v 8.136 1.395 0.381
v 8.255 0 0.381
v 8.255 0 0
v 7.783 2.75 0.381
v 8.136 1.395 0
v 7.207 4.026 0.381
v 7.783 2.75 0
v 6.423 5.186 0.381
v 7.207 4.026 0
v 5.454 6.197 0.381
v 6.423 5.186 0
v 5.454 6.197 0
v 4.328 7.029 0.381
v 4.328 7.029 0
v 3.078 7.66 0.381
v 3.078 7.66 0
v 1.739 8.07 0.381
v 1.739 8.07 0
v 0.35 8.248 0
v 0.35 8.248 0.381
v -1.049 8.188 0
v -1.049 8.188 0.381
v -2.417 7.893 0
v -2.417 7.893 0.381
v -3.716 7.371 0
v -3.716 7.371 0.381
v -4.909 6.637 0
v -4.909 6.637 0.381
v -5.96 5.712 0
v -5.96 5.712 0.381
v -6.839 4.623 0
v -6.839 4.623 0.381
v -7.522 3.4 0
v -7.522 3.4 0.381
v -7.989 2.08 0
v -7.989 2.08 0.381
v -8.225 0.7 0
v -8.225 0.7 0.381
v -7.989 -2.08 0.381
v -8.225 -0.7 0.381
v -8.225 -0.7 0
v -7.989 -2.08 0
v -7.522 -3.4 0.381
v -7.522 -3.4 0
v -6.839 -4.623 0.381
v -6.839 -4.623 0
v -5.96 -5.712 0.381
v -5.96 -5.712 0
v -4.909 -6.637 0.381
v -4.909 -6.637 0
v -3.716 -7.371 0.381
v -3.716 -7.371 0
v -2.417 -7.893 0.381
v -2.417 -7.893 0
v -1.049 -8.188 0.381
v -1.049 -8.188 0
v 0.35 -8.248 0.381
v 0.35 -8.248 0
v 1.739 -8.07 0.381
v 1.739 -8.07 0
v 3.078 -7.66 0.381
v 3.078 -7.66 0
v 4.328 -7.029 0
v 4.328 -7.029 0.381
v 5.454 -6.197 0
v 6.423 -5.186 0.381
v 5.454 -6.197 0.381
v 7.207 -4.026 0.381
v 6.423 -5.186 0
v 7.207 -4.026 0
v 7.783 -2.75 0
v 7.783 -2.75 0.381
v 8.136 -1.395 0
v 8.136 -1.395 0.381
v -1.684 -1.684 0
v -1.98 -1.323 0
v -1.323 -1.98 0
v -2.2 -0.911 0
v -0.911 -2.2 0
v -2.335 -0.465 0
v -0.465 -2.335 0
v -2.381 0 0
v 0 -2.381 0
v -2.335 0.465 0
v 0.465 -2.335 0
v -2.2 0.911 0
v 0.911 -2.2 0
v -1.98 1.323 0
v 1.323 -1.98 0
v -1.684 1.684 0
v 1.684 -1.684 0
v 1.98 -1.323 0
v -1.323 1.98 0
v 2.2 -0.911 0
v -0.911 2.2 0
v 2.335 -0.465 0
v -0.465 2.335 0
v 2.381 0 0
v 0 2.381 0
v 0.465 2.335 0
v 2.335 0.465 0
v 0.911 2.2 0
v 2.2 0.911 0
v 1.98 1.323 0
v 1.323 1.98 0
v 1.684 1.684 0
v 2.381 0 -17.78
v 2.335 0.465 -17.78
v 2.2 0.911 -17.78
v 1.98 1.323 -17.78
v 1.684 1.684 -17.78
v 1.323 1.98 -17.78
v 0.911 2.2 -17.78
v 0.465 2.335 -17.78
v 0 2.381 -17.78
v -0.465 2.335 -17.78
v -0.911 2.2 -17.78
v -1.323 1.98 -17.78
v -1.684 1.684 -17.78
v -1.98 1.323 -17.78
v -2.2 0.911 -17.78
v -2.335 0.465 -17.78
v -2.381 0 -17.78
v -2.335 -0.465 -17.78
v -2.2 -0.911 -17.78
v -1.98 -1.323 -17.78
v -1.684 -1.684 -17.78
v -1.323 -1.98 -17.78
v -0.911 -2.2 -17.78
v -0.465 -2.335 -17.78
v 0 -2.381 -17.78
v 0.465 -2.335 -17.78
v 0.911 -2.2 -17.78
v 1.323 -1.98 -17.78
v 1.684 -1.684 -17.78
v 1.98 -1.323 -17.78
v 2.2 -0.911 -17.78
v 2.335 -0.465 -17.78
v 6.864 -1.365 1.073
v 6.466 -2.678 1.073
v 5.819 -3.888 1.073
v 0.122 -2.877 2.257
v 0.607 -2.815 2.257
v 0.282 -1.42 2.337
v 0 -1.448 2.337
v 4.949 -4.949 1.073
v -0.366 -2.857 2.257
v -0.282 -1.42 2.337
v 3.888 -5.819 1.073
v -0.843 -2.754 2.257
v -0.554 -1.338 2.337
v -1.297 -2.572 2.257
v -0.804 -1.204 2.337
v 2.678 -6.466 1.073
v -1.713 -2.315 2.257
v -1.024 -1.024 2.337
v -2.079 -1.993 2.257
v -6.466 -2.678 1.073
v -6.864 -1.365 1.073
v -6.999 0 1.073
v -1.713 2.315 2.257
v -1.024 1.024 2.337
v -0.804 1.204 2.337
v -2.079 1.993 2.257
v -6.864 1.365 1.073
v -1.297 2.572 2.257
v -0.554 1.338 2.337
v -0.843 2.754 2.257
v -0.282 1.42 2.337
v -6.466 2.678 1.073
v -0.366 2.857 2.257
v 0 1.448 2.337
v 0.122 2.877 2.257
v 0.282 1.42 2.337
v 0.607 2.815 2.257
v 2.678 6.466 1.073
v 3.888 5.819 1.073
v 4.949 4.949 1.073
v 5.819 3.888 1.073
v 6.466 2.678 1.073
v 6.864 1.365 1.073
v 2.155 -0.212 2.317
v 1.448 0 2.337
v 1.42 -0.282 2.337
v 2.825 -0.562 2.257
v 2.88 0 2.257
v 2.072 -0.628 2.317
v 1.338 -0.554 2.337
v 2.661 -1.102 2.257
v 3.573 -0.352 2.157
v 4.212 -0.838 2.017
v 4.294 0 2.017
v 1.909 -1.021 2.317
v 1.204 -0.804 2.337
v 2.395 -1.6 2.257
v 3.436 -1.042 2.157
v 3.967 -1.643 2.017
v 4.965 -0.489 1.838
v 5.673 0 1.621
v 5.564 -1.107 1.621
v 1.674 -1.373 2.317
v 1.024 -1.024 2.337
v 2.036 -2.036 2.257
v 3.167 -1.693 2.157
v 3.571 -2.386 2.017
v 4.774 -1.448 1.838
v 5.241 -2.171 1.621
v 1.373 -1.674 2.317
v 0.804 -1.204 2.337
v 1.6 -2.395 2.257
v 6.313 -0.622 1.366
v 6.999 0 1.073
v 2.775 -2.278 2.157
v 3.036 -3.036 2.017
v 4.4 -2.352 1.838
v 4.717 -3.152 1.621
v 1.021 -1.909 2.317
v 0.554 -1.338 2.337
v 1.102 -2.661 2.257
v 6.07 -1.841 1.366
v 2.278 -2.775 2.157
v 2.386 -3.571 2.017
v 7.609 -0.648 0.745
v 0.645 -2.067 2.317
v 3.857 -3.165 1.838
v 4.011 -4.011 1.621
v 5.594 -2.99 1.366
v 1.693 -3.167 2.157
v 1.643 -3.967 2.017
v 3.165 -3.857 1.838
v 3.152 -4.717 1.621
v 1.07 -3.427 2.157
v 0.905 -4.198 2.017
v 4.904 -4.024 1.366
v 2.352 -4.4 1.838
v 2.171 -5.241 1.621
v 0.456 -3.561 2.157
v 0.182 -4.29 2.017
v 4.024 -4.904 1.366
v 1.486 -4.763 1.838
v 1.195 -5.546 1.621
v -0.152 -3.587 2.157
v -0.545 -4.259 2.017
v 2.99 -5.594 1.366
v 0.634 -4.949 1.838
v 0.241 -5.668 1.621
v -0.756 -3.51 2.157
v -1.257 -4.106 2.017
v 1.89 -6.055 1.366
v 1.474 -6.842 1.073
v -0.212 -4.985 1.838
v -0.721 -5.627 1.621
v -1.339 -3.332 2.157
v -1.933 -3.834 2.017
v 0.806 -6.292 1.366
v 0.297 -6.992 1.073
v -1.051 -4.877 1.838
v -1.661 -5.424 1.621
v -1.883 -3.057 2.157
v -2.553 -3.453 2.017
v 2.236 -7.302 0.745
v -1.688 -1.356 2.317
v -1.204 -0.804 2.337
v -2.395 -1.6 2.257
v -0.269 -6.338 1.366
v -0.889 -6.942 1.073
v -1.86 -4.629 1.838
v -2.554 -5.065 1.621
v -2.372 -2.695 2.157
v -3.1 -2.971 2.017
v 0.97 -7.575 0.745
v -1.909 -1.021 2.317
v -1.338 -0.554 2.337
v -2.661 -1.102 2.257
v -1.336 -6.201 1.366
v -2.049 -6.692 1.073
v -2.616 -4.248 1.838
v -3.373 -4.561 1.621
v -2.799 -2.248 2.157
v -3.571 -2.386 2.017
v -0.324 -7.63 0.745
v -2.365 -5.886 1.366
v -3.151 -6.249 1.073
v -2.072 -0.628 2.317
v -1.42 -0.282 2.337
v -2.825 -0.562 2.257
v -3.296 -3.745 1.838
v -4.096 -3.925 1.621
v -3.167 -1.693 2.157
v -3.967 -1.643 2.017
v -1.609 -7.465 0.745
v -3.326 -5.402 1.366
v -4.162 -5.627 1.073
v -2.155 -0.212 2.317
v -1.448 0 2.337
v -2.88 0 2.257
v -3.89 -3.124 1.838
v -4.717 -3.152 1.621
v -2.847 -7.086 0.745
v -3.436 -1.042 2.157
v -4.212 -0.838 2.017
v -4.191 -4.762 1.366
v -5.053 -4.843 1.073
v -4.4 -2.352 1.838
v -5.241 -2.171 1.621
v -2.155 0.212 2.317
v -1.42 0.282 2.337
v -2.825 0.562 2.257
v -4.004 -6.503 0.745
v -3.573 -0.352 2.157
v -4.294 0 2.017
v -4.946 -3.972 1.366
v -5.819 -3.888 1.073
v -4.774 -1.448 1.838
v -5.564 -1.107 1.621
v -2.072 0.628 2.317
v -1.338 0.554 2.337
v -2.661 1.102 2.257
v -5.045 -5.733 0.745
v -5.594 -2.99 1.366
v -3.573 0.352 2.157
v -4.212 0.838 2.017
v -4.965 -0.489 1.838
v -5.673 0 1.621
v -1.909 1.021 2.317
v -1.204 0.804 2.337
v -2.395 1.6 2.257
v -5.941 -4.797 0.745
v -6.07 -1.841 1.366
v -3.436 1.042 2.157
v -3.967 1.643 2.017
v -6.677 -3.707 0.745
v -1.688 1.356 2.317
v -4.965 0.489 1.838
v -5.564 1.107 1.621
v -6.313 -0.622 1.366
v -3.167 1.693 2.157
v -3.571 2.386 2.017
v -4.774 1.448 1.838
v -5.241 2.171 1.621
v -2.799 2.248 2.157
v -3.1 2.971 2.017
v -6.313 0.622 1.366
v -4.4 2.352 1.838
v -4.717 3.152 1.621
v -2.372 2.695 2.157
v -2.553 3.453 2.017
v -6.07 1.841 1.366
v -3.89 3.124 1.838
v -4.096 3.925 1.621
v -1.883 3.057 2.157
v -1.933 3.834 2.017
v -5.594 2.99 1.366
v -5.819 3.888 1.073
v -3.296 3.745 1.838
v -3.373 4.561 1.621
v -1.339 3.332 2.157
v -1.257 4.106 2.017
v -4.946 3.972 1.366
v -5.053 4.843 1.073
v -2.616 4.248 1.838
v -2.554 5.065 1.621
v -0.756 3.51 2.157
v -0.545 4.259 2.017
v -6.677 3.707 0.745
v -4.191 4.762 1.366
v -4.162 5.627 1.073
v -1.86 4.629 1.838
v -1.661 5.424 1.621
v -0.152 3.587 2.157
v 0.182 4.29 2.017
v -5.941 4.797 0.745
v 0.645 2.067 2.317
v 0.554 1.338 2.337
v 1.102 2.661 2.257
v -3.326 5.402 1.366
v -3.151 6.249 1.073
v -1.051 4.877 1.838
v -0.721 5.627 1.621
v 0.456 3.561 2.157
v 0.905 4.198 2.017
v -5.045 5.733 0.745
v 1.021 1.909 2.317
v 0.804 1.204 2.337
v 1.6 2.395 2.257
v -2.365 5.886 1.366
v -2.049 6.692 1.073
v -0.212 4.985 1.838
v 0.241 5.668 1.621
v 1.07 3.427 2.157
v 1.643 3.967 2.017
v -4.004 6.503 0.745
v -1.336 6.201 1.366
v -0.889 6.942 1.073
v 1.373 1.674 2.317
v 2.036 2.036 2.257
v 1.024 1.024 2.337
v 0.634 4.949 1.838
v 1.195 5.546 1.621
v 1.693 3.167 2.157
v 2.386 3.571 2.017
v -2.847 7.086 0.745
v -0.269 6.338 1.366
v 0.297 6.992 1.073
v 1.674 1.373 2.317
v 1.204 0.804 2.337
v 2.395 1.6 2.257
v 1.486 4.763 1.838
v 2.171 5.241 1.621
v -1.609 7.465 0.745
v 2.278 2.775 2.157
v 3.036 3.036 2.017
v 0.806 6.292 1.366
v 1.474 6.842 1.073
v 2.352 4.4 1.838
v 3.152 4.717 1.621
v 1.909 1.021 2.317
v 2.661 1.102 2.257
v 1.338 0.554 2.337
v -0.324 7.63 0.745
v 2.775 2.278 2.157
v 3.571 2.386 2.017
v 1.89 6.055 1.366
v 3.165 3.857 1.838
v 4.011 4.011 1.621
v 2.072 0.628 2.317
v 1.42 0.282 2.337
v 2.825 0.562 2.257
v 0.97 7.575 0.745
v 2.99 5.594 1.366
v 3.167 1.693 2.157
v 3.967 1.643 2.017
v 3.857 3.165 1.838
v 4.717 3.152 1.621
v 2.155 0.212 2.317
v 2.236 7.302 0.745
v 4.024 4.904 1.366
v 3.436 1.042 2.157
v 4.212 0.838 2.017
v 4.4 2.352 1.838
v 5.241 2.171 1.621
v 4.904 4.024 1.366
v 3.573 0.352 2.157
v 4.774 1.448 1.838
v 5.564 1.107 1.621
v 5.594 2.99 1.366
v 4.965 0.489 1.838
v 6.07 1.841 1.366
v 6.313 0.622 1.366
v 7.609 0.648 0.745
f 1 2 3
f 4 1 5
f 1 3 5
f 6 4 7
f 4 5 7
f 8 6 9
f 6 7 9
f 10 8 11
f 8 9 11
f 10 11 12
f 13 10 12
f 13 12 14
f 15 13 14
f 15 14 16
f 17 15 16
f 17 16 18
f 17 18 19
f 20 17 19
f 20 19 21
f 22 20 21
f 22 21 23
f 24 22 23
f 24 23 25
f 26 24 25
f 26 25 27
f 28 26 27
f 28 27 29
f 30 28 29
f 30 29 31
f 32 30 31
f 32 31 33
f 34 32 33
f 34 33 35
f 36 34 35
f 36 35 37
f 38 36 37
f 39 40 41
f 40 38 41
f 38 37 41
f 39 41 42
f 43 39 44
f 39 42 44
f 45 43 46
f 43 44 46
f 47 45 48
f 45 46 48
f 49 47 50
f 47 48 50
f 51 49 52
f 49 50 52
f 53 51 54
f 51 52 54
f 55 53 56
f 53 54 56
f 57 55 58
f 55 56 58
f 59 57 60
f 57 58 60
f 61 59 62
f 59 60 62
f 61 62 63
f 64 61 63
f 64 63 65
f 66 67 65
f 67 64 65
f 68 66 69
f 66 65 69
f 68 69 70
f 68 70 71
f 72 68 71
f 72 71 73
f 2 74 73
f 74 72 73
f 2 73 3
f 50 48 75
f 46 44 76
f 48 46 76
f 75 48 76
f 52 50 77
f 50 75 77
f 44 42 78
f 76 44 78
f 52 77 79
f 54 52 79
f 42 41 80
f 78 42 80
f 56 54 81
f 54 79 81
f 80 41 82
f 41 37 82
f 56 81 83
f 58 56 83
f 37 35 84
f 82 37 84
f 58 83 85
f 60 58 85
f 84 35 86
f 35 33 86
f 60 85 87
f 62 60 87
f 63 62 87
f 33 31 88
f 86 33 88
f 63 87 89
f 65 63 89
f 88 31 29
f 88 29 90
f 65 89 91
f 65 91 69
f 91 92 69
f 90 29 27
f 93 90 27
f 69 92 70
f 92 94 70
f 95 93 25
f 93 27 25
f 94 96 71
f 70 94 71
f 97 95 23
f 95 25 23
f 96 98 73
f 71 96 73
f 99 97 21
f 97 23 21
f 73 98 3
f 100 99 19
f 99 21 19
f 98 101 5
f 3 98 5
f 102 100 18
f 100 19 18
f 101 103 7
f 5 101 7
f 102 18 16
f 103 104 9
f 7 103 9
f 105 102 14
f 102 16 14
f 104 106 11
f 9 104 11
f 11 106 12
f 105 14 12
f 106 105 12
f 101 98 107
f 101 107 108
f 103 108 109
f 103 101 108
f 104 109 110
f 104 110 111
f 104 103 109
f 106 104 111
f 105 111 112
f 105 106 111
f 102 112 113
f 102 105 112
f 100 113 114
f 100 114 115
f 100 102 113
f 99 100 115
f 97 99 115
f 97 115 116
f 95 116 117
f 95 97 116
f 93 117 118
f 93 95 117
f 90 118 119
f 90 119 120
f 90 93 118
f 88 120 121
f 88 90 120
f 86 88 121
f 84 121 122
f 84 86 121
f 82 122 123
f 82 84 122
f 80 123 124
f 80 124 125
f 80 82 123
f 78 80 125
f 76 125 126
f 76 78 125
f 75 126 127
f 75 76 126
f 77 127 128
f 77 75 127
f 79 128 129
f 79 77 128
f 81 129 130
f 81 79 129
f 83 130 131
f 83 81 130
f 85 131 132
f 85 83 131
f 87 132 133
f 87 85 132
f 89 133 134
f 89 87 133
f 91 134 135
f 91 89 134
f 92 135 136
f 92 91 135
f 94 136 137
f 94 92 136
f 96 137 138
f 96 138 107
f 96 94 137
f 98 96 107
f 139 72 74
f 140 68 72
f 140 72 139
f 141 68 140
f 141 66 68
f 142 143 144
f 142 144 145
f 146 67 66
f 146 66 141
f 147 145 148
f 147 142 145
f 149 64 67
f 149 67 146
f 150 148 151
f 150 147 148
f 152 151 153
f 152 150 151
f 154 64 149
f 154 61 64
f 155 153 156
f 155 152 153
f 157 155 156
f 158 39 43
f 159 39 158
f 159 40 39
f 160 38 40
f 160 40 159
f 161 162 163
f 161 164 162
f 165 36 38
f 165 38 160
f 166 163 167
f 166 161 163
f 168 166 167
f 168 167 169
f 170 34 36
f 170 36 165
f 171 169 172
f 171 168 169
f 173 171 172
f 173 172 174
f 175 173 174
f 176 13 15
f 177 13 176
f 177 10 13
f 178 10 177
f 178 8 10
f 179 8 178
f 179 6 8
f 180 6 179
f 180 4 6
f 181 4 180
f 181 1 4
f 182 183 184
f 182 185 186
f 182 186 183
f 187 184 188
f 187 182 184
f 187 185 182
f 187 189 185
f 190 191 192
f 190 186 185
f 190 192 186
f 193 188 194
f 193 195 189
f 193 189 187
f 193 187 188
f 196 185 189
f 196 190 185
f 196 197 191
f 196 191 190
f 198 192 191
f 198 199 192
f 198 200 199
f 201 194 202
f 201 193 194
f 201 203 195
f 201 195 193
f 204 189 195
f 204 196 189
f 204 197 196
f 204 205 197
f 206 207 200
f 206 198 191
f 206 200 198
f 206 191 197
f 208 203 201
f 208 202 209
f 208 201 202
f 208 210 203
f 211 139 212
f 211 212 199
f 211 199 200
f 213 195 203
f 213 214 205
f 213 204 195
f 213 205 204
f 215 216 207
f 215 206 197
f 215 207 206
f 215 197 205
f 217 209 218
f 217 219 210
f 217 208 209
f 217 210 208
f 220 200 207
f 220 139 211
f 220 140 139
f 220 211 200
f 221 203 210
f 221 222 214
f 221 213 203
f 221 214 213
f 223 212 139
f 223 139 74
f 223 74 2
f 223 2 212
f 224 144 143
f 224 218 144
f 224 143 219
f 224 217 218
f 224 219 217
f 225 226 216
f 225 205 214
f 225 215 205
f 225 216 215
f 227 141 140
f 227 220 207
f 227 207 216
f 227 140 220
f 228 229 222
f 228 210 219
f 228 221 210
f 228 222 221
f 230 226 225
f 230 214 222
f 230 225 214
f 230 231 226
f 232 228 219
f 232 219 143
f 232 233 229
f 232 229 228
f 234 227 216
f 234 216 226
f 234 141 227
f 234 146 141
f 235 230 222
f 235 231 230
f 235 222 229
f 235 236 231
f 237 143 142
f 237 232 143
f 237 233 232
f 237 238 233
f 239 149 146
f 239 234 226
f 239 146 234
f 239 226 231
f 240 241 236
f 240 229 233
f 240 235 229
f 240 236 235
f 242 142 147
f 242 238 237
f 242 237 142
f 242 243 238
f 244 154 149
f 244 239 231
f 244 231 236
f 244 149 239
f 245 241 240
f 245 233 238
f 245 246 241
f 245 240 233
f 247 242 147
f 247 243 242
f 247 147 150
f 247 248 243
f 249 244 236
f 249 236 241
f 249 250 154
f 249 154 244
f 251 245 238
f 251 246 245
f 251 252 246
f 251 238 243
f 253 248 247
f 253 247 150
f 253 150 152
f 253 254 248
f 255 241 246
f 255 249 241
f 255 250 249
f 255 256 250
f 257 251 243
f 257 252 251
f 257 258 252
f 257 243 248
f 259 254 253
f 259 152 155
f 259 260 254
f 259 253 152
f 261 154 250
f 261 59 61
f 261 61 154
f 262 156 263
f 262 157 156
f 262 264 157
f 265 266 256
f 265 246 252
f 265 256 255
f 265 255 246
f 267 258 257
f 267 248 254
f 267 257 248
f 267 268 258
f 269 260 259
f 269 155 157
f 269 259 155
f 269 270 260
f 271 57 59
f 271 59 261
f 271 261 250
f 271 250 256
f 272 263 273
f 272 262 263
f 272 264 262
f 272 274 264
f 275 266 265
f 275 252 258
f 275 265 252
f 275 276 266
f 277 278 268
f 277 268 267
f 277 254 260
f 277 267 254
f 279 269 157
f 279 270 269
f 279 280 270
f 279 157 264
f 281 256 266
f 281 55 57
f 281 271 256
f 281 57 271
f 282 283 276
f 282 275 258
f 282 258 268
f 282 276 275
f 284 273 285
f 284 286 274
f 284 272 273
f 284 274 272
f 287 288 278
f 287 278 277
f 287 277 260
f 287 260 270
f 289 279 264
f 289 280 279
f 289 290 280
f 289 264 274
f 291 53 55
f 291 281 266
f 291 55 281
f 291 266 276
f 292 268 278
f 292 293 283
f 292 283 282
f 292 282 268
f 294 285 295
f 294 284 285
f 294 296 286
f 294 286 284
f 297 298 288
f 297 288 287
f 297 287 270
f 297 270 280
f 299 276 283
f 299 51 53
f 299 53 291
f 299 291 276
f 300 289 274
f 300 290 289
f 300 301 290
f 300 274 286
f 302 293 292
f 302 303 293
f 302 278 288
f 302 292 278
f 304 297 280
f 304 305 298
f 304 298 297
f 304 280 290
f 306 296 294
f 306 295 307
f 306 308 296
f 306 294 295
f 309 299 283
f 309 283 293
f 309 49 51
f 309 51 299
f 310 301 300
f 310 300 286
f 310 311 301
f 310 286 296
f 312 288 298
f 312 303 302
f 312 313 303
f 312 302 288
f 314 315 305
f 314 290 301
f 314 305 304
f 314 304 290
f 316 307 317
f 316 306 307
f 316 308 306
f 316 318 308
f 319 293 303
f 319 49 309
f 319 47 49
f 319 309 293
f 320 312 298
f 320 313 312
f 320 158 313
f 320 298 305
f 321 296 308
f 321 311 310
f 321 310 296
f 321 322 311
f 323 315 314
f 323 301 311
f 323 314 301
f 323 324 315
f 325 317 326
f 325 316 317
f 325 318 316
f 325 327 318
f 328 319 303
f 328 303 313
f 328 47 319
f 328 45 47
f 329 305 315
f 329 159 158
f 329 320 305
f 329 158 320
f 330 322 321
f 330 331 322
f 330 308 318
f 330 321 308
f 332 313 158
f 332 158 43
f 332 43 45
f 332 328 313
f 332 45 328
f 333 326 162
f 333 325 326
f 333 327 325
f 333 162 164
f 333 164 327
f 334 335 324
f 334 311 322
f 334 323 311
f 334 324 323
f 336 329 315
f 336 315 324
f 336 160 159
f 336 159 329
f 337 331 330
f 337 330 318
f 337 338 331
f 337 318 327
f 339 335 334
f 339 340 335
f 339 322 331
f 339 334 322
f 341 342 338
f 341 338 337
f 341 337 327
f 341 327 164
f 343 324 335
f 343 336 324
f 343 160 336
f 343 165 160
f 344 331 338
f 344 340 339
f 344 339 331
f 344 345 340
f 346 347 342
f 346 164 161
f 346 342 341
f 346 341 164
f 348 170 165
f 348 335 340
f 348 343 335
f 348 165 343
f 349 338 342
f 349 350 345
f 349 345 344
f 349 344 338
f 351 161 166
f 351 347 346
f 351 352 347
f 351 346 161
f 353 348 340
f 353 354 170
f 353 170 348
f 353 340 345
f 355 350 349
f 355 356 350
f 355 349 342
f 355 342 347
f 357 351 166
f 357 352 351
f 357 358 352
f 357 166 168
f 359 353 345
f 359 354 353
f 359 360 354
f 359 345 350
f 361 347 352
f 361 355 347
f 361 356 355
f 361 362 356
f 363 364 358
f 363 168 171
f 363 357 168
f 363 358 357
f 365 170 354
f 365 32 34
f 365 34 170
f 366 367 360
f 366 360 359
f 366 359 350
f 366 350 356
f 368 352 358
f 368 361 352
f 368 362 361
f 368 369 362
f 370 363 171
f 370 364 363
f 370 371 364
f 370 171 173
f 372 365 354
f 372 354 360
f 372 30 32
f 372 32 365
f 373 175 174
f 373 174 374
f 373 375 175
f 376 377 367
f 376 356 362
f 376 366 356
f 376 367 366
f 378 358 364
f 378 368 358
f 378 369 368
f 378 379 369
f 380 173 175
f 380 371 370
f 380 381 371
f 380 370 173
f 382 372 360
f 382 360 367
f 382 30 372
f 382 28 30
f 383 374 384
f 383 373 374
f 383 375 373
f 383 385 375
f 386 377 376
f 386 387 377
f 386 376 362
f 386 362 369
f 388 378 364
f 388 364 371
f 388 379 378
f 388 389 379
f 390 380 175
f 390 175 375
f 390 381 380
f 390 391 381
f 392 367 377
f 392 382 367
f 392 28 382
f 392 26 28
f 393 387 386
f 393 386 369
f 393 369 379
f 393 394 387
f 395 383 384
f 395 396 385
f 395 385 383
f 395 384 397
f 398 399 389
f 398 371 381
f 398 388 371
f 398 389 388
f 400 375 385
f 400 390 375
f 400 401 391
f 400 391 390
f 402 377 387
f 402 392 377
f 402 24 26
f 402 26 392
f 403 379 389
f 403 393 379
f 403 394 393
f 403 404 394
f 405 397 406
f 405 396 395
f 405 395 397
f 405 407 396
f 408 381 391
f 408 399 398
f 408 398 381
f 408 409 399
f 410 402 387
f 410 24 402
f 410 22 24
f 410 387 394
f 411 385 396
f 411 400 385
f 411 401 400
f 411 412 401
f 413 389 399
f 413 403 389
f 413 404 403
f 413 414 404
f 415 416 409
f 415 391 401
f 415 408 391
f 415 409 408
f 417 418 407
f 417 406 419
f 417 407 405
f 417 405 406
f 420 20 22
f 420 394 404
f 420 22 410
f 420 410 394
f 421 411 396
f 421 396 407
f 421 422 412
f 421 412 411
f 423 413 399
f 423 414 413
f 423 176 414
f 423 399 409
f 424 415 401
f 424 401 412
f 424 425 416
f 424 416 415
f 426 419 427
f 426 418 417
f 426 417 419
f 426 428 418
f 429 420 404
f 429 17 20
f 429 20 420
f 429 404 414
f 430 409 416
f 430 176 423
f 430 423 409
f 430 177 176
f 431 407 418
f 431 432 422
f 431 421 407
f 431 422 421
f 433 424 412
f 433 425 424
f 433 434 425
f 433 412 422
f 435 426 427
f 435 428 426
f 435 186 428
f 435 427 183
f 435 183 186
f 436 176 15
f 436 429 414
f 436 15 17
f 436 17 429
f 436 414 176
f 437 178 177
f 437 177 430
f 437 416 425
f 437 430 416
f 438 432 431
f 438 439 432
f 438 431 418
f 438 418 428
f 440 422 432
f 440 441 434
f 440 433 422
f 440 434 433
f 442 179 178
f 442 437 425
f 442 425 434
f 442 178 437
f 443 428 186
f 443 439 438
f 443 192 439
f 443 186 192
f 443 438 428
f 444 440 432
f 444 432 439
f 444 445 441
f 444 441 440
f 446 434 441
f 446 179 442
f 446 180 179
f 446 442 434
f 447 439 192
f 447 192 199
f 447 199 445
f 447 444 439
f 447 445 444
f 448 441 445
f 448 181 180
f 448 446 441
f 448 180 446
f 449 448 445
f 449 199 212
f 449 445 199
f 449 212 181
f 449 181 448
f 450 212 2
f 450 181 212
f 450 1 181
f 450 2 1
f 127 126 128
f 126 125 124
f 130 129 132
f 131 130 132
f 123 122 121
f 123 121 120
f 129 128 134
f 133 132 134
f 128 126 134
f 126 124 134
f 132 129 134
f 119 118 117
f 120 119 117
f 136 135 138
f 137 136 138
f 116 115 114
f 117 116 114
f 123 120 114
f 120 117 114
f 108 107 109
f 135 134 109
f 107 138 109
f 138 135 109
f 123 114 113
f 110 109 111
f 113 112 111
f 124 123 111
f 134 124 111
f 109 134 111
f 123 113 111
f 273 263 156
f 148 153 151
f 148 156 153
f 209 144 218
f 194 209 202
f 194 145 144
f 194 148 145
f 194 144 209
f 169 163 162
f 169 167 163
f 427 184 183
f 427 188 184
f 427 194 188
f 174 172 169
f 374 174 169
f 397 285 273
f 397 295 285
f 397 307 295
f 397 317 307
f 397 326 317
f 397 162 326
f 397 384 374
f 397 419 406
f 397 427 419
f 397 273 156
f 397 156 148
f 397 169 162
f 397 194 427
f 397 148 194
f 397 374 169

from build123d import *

# Parameters (mm, degrees)
SKETCH1_R           = 8.255
BOSS_EXTRUDE1_DEPTH = 2.3368
SKETCH2_R           = 2.38125
BOSS_EXTRUDE2_DEPTH = 17.78


with BuildPart() as part:
    # Sketch1 → Boss-Extrude1 (new body)
    with BuildSketch(Plane.XY):
        Circle(SKETCH1_R)
    extrude(amount=BOSS_EXTRUDE1_DEPTH)

    # Sketch2 → Boss-Extrude2 (add)
    with BuildSketch(Plane.XY):
        Circle(SKETCH2_R)
    extrude(amount=-BOSS_EXTRUDE2_DEPTH)

    # Sketch3 → Cut-Revolve1 (revolve, cut)
    with BuildSketch(Plane(origin=(0, 0, 0), x_dir=(1, 0, 0), z_dir=(0, 1, 0))):
        with BuildLine():
            ThreePointArc((1.4478, -2.3368), (4.989096566, -1.838155581), (8.255, -0.381))
            Line((8.255, -0.381), (8.255, -2.3368))
            Line((8.255, -2.3368), (1.4478, -2.3368))
        make_face()
    revolve(axis=Axis((0, 0, 2.3368), (0, 0, -1)), mode=Mode.SUBTRACT)


solid = part.part
